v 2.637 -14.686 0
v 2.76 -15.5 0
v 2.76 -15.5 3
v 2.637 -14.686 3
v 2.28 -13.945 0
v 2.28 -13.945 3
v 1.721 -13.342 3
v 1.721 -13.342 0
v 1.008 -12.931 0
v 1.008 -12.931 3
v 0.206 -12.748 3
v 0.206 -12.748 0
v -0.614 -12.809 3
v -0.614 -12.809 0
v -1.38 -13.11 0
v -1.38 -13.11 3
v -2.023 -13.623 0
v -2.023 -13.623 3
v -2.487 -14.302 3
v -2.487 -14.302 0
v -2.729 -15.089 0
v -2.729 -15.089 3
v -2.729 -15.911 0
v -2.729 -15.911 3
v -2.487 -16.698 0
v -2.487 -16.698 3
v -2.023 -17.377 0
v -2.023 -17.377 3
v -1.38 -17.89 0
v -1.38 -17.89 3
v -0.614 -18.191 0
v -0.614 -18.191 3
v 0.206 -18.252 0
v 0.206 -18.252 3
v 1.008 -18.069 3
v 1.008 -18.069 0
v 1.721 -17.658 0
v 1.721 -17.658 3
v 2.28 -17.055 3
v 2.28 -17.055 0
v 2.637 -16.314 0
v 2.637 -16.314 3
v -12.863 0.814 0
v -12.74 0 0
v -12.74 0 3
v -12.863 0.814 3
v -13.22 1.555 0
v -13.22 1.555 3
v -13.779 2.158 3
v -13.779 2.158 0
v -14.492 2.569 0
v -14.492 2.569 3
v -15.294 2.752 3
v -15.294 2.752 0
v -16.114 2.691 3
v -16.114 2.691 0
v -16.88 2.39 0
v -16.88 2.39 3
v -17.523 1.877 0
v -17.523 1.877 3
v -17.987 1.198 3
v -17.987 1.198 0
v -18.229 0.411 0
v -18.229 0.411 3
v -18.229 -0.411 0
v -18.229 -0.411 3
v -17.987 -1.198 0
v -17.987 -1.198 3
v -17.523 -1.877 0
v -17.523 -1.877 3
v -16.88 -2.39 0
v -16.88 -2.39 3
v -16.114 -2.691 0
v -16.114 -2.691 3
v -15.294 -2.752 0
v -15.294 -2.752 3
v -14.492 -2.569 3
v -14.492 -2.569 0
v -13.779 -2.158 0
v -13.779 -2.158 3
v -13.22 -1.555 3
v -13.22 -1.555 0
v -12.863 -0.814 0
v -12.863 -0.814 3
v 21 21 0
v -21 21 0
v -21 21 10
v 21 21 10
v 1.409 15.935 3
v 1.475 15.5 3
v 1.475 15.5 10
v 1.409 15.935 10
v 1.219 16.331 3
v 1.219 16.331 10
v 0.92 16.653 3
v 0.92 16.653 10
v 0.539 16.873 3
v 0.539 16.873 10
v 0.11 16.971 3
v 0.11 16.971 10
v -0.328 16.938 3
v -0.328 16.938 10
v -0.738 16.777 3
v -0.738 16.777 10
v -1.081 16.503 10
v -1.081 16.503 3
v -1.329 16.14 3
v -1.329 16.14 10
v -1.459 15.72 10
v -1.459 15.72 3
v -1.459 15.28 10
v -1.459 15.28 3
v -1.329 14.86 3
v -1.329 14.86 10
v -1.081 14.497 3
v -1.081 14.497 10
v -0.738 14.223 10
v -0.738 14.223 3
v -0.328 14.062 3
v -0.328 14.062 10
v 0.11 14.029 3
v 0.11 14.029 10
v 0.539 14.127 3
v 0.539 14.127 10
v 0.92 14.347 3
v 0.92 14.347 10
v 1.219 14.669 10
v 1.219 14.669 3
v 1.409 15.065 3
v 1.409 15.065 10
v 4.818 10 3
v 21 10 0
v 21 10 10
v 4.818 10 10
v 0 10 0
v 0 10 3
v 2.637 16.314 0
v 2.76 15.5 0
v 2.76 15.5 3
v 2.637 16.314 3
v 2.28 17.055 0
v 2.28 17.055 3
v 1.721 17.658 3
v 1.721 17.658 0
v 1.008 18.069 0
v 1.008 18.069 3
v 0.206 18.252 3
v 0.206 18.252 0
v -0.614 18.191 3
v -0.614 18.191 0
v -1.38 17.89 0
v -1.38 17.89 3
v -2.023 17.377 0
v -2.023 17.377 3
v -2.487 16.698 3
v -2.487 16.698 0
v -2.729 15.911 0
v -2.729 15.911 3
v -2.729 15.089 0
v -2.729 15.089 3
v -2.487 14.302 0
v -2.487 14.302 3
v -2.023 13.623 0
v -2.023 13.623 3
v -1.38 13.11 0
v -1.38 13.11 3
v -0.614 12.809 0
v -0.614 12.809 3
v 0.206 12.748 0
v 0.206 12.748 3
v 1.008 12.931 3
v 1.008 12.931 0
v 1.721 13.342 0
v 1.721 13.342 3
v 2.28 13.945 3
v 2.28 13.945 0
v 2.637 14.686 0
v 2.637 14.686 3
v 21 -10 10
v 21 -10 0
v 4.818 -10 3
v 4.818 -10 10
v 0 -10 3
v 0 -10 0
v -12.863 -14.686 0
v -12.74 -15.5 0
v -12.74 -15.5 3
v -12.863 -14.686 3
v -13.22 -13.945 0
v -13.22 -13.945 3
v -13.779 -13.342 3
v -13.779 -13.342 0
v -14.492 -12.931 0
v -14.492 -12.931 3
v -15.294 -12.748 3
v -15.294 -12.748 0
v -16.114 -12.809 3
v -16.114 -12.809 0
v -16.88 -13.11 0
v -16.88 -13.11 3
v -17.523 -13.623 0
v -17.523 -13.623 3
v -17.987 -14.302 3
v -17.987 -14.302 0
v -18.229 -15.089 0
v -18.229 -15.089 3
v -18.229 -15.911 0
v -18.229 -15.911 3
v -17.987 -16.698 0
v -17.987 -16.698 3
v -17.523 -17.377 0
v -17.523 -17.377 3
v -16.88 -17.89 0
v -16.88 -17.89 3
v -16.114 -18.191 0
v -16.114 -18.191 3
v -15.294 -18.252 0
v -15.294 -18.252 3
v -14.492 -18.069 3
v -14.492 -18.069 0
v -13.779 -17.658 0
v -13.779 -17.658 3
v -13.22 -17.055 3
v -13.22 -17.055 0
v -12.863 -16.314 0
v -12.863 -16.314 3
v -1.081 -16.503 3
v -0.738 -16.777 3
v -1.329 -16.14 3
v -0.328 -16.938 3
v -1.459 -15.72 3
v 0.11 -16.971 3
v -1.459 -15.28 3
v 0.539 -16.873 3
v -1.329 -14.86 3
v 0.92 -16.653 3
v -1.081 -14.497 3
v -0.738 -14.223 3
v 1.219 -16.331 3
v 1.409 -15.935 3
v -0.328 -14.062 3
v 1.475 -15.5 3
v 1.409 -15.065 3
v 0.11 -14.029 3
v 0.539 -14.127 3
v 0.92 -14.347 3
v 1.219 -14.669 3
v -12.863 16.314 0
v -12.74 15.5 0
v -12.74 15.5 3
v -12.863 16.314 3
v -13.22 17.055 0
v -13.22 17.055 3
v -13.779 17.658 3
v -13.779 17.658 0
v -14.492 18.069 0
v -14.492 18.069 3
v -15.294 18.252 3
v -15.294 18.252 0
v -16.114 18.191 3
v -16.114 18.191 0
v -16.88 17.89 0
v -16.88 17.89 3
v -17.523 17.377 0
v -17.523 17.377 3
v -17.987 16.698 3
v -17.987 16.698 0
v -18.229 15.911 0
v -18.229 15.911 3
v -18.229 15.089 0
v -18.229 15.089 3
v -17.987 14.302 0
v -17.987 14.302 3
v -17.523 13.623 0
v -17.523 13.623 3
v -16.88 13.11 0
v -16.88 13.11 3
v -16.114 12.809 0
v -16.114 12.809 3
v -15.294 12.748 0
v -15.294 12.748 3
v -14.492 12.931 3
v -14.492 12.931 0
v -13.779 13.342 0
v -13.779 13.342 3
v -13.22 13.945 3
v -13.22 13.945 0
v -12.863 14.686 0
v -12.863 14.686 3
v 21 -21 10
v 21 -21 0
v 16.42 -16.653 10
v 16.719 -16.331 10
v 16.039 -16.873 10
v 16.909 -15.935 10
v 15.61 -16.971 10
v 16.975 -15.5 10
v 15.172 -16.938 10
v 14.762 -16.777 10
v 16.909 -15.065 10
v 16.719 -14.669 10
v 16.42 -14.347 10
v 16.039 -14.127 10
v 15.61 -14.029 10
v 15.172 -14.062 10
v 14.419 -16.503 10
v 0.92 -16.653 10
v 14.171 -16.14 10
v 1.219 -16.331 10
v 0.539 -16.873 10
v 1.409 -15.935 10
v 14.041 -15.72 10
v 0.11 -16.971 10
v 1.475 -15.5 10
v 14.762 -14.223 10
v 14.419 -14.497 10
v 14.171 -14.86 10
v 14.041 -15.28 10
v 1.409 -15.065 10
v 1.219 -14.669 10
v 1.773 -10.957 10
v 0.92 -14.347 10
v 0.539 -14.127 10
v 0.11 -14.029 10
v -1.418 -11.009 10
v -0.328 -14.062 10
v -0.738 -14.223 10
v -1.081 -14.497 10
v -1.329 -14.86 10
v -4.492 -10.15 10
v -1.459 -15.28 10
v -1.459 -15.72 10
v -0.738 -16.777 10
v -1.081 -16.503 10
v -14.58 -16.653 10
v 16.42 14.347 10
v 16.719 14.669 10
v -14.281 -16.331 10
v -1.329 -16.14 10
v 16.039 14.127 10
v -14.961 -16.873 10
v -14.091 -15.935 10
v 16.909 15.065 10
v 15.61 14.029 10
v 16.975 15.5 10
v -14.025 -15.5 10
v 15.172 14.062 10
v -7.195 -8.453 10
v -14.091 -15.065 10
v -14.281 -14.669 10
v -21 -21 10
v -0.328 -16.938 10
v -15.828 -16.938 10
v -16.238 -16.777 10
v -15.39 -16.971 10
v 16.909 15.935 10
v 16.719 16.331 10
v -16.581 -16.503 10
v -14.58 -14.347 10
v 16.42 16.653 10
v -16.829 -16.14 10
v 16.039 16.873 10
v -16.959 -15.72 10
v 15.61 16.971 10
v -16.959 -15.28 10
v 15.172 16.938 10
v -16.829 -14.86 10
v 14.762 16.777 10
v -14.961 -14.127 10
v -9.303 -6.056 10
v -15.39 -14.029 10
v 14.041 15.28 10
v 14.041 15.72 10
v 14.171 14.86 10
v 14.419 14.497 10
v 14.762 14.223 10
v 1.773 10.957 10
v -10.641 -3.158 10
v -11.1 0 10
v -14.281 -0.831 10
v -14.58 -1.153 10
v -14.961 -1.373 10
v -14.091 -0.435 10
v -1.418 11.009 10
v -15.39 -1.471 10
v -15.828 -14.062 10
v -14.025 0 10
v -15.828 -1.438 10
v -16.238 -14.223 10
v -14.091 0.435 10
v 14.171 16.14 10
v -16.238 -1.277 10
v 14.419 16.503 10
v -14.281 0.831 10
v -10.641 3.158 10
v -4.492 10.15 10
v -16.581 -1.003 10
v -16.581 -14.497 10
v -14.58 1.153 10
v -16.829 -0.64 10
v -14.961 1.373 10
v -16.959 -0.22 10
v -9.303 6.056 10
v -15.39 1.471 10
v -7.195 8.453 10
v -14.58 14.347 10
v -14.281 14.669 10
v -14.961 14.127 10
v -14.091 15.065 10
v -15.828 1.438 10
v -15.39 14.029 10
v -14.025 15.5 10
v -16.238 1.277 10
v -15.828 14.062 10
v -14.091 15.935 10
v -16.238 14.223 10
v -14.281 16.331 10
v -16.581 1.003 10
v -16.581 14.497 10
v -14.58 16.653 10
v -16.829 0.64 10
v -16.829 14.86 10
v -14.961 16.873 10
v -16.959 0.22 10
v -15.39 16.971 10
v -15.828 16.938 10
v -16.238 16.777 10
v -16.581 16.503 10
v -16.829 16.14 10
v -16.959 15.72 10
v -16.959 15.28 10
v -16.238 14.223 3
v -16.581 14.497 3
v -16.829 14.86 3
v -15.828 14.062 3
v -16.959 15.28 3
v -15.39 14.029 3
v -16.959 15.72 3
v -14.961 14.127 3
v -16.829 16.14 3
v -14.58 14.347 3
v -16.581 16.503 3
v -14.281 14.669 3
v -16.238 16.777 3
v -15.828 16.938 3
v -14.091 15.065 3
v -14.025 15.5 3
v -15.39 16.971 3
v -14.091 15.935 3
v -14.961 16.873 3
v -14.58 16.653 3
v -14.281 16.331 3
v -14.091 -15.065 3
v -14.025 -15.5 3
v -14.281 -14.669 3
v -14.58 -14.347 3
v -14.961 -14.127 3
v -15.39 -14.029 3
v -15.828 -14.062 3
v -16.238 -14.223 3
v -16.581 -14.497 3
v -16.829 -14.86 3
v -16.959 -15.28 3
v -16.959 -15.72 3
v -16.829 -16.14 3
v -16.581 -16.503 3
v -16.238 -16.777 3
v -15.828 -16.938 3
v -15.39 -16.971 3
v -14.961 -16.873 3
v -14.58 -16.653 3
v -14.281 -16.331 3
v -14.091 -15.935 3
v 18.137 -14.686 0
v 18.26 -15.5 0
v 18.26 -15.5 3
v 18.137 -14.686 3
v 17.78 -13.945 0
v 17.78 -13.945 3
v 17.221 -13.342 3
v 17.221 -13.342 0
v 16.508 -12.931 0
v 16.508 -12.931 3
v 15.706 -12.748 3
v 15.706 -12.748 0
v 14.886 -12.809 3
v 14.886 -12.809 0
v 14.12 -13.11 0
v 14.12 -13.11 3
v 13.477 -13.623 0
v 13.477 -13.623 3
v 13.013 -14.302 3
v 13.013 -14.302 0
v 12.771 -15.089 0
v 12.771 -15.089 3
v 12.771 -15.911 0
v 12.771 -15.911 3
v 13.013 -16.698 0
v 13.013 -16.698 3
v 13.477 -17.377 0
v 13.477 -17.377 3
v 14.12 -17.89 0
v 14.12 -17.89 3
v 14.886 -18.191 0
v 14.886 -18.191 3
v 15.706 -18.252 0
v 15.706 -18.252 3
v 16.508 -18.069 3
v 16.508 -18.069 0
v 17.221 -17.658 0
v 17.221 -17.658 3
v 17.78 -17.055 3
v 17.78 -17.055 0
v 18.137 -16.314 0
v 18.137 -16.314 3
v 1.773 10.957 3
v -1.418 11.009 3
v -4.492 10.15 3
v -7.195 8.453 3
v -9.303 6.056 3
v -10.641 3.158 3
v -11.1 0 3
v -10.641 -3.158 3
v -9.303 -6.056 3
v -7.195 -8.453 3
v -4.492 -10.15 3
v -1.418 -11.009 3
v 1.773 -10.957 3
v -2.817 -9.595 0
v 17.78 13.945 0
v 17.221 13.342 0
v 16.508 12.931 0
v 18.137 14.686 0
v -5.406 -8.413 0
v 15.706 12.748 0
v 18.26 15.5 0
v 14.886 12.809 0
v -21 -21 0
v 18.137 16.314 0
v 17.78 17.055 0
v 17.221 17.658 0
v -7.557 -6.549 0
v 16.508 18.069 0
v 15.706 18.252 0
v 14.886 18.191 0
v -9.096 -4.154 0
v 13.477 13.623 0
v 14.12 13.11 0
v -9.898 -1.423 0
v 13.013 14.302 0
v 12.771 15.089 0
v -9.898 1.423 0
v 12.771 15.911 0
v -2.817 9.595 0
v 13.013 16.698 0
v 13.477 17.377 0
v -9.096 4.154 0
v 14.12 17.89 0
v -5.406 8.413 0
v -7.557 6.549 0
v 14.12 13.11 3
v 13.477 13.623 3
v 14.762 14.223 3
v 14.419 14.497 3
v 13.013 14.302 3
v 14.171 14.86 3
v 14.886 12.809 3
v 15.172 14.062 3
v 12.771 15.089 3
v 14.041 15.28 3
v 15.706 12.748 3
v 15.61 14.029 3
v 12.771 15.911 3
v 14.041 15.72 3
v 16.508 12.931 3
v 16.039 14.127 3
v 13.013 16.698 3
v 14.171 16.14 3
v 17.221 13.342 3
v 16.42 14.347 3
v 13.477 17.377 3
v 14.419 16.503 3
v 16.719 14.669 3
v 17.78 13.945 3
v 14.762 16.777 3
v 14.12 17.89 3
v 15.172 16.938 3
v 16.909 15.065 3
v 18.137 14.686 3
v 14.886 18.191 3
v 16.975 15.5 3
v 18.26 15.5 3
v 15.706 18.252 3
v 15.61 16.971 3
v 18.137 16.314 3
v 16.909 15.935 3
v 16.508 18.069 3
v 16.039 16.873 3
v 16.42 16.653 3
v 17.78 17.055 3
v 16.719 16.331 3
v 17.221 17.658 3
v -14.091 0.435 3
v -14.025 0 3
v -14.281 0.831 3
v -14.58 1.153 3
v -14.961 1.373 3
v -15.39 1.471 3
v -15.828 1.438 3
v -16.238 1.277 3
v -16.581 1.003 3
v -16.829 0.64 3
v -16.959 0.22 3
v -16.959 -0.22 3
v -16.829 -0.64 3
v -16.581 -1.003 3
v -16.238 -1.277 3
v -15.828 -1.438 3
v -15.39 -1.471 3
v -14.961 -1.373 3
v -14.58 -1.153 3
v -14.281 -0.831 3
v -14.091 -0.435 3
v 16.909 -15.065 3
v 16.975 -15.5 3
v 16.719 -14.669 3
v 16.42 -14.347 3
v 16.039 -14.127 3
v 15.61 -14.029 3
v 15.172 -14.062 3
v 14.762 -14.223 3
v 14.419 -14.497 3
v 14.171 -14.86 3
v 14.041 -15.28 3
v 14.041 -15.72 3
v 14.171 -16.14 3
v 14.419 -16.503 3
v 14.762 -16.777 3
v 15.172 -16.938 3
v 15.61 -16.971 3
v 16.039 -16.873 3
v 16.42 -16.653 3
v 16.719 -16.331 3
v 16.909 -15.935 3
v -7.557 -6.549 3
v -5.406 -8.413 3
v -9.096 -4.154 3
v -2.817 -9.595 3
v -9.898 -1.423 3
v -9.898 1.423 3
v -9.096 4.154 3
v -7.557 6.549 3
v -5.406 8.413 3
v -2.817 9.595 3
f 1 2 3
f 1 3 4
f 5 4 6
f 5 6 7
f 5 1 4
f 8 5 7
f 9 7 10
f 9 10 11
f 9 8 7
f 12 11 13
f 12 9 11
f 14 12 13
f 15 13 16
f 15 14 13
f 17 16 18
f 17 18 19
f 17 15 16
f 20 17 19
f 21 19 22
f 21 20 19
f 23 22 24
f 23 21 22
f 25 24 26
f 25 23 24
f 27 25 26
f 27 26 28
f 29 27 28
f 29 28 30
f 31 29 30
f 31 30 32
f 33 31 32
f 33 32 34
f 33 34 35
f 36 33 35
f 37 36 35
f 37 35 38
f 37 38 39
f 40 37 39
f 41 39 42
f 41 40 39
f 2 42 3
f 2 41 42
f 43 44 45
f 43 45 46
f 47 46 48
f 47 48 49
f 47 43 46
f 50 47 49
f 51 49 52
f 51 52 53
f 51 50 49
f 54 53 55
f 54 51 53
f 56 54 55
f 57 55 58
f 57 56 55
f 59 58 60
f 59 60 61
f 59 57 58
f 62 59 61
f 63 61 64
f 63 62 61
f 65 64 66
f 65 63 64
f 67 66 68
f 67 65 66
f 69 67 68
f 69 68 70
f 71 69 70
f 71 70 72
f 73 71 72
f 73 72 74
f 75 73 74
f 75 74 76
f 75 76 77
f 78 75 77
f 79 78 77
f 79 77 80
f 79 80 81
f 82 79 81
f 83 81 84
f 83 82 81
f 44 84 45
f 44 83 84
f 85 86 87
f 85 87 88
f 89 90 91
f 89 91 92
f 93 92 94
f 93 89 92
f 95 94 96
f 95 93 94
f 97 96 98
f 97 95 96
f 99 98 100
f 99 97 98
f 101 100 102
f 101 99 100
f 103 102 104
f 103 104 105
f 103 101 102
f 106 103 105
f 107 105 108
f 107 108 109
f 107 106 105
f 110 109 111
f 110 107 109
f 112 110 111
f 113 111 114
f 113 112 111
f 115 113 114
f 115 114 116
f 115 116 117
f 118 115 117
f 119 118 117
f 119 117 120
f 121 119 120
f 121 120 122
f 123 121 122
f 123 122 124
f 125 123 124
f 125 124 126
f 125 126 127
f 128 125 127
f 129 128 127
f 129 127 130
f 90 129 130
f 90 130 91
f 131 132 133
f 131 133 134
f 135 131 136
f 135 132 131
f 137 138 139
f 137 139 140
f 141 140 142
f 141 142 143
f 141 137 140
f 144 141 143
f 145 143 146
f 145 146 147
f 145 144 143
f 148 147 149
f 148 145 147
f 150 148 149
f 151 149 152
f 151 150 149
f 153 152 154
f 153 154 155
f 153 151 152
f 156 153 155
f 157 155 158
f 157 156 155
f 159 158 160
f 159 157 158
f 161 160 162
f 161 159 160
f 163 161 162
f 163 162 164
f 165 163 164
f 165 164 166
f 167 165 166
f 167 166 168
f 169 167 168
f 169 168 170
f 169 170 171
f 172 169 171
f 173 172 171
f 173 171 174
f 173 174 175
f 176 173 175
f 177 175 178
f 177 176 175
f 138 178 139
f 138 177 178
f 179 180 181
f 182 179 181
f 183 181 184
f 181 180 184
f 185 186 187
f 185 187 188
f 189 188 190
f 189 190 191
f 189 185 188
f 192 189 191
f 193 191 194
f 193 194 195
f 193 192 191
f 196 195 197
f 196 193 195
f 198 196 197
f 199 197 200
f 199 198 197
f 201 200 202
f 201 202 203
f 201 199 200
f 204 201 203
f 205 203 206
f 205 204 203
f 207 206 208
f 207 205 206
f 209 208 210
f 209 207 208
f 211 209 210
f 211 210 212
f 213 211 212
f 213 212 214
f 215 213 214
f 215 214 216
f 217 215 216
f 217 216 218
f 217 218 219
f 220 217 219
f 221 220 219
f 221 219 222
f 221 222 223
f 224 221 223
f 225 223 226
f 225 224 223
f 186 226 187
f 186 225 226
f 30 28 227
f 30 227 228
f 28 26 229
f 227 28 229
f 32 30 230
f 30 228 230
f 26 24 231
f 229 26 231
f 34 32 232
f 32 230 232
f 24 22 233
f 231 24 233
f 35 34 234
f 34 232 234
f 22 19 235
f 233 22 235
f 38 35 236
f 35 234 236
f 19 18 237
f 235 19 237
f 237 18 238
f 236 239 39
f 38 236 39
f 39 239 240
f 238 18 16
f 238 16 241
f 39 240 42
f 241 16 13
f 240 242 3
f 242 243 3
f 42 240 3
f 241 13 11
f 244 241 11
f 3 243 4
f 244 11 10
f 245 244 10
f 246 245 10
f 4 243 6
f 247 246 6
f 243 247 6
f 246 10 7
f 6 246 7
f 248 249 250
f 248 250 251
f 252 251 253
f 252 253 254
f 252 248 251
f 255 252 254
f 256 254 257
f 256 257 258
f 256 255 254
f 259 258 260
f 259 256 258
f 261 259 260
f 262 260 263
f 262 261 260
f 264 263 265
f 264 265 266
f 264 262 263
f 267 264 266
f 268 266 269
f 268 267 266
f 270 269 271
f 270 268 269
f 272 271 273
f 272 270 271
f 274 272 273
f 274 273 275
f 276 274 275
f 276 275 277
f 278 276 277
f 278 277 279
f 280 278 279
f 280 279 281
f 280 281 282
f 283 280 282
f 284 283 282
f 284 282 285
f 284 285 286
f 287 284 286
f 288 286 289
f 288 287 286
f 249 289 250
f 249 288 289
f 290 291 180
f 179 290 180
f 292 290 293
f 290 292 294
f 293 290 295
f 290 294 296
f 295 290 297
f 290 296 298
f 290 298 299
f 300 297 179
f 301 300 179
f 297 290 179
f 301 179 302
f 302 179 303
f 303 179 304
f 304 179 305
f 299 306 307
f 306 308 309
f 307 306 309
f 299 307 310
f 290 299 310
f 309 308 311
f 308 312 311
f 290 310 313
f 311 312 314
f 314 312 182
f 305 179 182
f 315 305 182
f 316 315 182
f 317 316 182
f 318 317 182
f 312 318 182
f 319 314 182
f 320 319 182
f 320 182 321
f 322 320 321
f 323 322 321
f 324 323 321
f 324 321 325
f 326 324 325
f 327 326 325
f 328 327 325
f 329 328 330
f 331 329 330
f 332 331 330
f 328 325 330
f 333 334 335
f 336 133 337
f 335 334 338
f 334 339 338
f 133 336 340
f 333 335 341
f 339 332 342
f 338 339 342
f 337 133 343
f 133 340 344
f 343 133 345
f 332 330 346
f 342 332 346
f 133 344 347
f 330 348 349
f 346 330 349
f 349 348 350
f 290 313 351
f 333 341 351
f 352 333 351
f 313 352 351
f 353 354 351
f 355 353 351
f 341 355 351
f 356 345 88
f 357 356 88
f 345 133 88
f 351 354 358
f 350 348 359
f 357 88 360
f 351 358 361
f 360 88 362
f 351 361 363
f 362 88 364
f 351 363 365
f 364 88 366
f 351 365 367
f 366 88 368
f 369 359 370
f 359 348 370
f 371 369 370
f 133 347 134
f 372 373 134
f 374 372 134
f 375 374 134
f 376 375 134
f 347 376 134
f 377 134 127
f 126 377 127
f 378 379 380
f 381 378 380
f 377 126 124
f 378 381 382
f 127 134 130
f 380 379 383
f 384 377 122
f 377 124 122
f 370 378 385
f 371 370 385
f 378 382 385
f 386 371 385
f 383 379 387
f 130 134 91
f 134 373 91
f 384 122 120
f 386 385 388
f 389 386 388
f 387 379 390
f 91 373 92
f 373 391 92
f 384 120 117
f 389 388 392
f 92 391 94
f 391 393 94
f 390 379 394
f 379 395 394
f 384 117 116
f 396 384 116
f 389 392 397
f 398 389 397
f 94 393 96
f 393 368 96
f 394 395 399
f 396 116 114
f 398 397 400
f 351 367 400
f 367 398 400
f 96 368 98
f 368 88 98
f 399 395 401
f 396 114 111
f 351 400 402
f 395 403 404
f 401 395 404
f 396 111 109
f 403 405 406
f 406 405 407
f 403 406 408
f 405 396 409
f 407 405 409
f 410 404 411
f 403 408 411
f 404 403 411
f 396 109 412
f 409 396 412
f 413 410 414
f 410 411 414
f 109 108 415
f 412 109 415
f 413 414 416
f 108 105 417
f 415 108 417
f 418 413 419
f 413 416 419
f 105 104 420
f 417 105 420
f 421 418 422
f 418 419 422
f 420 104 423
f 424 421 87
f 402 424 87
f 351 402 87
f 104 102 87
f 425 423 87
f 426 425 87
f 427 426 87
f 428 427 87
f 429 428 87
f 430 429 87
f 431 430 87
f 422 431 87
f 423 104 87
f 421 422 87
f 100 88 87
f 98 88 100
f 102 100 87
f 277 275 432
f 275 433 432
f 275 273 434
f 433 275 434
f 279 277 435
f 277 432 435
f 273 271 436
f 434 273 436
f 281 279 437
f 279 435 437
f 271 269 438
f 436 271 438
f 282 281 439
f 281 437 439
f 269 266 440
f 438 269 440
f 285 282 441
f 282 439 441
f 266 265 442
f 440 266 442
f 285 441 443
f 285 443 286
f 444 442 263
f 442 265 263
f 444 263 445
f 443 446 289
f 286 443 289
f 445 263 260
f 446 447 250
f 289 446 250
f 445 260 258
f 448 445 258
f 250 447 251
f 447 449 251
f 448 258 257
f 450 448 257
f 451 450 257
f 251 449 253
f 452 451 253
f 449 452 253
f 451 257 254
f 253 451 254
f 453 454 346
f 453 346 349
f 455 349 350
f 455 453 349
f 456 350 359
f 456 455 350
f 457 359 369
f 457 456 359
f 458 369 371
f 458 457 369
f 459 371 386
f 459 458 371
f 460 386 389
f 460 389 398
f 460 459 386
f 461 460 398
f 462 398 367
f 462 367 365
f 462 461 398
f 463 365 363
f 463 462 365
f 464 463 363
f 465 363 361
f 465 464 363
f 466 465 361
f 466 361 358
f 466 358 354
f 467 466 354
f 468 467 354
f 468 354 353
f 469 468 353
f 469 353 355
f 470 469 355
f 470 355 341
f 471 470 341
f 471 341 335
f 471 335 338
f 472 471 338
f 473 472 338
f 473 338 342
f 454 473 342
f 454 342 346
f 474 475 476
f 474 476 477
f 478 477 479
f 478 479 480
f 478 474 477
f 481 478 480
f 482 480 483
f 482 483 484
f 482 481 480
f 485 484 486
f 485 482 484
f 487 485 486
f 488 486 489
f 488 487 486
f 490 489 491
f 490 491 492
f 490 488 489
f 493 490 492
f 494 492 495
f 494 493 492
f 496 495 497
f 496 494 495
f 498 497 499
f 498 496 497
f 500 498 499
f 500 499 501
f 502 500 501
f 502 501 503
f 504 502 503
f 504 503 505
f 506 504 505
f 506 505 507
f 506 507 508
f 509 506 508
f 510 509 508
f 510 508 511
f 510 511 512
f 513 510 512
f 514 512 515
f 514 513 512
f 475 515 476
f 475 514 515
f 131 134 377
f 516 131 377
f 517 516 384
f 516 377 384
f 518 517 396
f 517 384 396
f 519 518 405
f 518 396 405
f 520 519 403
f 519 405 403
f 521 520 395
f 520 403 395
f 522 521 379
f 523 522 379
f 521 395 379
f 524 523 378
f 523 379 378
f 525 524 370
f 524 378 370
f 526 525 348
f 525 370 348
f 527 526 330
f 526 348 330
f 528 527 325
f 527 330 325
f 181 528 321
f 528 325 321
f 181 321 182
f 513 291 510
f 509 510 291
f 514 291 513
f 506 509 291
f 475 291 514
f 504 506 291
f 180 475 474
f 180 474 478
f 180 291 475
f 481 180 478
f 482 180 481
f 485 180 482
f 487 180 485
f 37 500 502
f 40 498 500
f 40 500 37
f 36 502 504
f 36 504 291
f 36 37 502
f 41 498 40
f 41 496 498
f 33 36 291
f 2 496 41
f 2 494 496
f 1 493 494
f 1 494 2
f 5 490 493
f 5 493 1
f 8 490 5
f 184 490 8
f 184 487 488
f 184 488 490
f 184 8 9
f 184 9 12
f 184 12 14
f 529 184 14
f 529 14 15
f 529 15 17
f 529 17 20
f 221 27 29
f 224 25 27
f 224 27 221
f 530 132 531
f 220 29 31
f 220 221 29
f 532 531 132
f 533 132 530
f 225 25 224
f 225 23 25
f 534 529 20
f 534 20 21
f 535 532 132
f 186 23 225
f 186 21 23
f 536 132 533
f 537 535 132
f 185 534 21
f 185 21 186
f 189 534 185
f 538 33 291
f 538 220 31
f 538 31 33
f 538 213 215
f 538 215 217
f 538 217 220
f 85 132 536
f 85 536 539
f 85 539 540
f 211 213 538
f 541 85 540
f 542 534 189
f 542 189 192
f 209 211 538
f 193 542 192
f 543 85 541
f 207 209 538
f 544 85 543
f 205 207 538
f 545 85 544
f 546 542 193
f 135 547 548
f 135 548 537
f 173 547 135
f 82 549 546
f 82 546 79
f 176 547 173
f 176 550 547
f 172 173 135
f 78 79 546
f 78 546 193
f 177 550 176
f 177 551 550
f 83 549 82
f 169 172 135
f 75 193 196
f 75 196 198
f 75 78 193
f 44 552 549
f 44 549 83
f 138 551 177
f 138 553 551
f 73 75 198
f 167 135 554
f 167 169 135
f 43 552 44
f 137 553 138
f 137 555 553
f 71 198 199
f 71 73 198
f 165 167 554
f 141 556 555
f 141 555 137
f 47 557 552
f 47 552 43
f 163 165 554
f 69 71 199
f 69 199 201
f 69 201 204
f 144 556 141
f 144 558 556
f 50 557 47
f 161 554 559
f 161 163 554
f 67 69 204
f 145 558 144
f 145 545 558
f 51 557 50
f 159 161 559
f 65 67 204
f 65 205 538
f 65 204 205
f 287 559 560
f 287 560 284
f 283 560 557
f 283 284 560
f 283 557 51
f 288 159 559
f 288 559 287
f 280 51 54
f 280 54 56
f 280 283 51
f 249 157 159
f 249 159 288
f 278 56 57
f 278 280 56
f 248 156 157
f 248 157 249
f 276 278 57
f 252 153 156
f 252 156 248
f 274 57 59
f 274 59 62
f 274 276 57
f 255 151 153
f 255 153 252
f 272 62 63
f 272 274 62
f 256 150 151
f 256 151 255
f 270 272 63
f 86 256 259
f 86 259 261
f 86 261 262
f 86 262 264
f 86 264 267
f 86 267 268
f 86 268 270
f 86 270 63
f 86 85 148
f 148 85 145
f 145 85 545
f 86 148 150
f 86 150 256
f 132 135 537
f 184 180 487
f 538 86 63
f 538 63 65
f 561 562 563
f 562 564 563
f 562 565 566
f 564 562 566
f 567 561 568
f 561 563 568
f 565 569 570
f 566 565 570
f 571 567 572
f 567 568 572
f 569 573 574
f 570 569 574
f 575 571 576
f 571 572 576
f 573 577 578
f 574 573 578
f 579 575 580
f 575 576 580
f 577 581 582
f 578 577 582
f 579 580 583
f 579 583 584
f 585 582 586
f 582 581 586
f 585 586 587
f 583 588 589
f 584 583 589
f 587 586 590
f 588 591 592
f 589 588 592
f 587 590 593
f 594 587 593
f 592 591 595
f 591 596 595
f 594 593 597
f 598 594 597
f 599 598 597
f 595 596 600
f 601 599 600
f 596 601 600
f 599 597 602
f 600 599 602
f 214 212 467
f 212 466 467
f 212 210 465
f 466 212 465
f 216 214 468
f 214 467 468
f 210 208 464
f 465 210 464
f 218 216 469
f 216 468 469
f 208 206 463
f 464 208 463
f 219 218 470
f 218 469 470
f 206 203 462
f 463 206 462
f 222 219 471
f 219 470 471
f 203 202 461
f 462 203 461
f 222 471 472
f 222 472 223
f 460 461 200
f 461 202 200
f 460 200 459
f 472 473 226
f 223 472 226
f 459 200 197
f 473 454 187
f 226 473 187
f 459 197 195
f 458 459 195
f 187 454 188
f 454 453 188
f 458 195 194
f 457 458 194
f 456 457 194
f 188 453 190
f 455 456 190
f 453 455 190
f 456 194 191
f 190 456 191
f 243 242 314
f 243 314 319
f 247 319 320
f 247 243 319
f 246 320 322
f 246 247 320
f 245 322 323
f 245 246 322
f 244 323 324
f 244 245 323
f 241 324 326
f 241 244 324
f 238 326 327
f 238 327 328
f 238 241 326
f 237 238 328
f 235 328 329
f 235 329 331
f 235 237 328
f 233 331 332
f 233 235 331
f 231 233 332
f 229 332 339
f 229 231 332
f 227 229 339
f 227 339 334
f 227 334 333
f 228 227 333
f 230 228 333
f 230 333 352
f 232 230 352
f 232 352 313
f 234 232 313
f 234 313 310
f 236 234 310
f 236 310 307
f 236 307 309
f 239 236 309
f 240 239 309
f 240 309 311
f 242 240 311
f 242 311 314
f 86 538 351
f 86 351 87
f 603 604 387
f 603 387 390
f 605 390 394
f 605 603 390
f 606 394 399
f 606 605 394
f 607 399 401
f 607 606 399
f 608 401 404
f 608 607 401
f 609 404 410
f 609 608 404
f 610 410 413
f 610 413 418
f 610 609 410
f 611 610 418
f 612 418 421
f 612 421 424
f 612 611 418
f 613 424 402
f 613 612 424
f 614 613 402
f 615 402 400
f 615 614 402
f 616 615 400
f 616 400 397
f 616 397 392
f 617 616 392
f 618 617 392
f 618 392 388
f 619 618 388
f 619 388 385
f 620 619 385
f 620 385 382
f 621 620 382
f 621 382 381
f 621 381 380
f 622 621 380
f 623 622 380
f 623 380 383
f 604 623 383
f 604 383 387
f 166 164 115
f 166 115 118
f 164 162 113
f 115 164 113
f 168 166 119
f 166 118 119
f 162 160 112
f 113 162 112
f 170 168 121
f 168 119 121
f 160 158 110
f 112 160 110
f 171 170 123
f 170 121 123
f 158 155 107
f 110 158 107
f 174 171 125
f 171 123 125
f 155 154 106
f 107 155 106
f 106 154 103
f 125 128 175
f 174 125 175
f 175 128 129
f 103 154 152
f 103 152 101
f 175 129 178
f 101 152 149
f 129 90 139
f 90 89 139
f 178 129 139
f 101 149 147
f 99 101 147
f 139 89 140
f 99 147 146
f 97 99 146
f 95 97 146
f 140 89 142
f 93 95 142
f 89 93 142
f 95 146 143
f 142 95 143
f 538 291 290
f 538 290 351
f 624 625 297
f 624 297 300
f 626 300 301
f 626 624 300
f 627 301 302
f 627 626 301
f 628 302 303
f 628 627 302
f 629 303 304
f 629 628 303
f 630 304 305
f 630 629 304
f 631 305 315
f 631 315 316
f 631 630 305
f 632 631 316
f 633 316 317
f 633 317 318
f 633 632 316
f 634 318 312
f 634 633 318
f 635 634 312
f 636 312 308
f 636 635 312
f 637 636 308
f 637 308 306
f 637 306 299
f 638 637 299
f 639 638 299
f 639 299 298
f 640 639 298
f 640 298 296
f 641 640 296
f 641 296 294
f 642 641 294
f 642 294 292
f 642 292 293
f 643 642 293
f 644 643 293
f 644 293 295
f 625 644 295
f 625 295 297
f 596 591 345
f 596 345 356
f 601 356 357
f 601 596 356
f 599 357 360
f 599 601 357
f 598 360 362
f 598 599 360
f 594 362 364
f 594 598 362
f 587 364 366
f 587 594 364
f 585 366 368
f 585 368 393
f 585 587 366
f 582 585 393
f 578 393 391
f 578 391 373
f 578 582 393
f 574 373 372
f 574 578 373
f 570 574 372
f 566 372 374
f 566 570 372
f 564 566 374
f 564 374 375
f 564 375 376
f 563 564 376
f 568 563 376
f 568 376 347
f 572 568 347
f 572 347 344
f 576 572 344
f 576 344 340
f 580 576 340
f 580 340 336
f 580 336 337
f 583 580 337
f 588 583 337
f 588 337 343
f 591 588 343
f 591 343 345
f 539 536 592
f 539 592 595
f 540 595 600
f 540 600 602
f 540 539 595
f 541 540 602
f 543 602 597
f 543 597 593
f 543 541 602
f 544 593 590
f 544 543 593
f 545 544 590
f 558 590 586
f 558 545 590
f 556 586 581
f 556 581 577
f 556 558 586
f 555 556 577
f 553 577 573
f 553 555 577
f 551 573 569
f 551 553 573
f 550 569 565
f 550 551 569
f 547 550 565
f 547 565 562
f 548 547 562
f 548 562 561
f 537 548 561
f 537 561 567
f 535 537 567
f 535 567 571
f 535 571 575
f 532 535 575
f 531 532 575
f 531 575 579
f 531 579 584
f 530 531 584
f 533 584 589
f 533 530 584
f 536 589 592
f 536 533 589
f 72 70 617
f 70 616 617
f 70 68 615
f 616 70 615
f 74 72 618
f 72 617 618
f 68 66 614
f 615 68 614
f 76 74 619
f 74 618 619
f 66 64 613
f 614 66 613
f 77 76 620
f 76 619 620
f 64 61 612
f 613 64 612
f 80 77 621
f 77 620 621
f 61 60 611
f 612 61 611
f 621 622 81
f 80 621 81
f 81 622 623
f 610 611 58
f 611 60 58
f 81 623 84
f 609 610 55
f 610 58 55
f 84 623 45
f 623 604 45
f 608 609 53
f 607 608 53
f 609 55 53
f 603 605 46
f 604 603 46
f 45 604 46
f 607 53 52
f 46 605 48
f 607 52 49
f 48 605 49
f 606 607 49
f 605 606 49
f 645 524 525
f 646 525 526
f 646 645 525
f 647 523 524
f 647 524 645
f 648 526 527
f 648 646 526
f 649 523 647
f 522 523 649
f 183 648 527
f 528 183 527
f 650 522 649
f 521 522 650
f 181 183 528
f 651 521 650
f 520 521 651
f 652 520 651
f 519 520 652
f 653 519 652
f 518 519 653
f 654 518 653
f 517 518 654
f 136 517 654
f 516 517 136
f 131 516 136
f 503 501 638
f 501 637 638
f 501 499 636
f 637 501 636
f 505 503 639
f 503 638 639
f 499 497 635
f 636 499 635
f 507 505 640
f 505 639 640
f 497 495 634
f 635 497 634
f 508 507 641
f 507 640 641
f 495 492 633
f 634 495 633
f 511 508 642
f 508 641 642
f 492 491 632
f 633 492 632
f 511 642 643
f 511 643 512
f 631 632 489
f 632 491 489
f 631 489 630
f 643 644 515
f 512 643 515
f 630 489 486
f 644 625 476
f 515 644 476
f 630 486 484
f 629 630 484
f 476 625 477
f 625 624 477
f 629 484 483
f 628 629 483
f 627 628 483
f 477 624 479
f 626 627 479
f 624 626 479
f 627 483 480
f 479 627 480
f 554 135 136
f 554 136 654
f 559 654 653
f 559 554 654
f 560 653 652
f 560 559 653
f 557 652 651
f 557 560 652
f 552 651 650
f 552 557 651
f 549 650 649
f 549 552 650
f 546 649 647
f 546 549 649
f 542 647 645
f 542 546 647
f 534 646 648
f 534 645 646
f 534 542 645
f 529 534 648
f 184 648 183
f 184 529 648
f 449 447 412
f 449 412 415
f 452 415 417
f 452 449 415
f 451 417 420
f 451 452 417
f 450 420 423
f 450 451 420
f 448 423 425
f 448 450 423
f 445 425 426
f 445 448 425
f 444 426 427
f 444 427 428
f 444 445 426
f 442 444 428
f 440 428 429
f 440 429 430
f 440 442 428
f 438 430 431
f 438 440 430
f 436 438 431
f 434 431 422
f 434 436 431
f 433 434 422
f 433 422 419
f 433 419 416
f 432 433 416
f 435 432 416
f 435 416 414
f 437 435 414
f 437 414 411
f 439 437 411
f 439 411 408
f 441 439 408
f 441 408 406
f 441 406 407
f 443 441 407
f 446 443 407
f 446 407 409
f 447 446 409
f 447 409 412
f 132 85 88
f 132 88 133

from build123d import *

# Parameters (mm, degrees)
SKETCH004_R     = 1.475
PAD003_DEPTH    = 10
SKETCH009_R     = 2.76
POCKET002_DEPTH = 3
SKETCH014_R     = 11.1
POCKET006_DEPTH = 7


with BuildPart() as part:
    # Sketch004 → Pad003 (new body)
    with BuildSketch(Plane.XY):
        with BuildLine():
            Line((-21, 21), (21, 21))
            Line((21, 21), (21, 10))
            Line((21, 10), (0, 10))
            ThreePointArc((0, 10), (-10, 0), (0, -10))
            Line((21, -10), (0, -10))
            Line((21, -21), (21, -10))
            Line((21, -21), (-21, -21))
            Line((-21, -21), (-21, 21))
        make_face()
        with Locations((-15.5, 15.5)):
            Circle(SKETCH004_R, mode=Mode.SUBTRACT)
        with Locations((15.5, 15.5)):
            Circle(SKETCH004_R, mode=Mode.SUBTRACT)
        with Locations((-15.5, -15.5)):
            Circle(SKETCH004_R, mode=Mode.SUBTRACT)
        with Locations((15.5, -15.5)):
            Circle(SKETCH004_R, mode=Mode.SUBTRACT)
        with Locations((-15.5, 0)):
            Circle(SKETCH004_R, mode=Mode.SUBTRACT)
        with Locations((0, 15.5)):
            Circle(SKETCH004_R, mode=Mode.SUBTRACT)
        with Locations((0, -15.5)):
            Circle(SKETCH004_R, mode=Mode.SUBTRACT)
    extrude(amount=PAD003_DEPTH)

    # Sketch009 → Pocket002 (cut)
    with BuildSketch(Plane.XY):
        with Locations((-15.5, 15.5)):
            Circle(SKETCH009_R)
        with Locations((15.5, 15.5)):
            Circle(SKETCH009_R)
        with Locations((-15.5, -15.5)):
            Circle(SKETCH009_R)
        with Locations((15.5, -15.5)):
            Circle(SKETCH009_R)
        with Locations((-15.5, 0)):
            Circle(SKETCH009_R)
        with Locations((0, 15.5)):
            Circle(SKETCH009_R)
        with Locations((0, -15.5)):
            Circle(SKETCH009_R)
    extrude(amount=POCKET002_DEPTH, mode=Mode.SUBTRACT)

    # Sketch014 (on Face5 of Pocket002) → Pocket006 (cut)
    with BuildSketch(Plane.XY.offset(10)):
        Circle(SKETCH014_R)
    extrude(amount=-POCKET006_DEPTH, mode=Mode.SUBTRACT)


solid = part.part
